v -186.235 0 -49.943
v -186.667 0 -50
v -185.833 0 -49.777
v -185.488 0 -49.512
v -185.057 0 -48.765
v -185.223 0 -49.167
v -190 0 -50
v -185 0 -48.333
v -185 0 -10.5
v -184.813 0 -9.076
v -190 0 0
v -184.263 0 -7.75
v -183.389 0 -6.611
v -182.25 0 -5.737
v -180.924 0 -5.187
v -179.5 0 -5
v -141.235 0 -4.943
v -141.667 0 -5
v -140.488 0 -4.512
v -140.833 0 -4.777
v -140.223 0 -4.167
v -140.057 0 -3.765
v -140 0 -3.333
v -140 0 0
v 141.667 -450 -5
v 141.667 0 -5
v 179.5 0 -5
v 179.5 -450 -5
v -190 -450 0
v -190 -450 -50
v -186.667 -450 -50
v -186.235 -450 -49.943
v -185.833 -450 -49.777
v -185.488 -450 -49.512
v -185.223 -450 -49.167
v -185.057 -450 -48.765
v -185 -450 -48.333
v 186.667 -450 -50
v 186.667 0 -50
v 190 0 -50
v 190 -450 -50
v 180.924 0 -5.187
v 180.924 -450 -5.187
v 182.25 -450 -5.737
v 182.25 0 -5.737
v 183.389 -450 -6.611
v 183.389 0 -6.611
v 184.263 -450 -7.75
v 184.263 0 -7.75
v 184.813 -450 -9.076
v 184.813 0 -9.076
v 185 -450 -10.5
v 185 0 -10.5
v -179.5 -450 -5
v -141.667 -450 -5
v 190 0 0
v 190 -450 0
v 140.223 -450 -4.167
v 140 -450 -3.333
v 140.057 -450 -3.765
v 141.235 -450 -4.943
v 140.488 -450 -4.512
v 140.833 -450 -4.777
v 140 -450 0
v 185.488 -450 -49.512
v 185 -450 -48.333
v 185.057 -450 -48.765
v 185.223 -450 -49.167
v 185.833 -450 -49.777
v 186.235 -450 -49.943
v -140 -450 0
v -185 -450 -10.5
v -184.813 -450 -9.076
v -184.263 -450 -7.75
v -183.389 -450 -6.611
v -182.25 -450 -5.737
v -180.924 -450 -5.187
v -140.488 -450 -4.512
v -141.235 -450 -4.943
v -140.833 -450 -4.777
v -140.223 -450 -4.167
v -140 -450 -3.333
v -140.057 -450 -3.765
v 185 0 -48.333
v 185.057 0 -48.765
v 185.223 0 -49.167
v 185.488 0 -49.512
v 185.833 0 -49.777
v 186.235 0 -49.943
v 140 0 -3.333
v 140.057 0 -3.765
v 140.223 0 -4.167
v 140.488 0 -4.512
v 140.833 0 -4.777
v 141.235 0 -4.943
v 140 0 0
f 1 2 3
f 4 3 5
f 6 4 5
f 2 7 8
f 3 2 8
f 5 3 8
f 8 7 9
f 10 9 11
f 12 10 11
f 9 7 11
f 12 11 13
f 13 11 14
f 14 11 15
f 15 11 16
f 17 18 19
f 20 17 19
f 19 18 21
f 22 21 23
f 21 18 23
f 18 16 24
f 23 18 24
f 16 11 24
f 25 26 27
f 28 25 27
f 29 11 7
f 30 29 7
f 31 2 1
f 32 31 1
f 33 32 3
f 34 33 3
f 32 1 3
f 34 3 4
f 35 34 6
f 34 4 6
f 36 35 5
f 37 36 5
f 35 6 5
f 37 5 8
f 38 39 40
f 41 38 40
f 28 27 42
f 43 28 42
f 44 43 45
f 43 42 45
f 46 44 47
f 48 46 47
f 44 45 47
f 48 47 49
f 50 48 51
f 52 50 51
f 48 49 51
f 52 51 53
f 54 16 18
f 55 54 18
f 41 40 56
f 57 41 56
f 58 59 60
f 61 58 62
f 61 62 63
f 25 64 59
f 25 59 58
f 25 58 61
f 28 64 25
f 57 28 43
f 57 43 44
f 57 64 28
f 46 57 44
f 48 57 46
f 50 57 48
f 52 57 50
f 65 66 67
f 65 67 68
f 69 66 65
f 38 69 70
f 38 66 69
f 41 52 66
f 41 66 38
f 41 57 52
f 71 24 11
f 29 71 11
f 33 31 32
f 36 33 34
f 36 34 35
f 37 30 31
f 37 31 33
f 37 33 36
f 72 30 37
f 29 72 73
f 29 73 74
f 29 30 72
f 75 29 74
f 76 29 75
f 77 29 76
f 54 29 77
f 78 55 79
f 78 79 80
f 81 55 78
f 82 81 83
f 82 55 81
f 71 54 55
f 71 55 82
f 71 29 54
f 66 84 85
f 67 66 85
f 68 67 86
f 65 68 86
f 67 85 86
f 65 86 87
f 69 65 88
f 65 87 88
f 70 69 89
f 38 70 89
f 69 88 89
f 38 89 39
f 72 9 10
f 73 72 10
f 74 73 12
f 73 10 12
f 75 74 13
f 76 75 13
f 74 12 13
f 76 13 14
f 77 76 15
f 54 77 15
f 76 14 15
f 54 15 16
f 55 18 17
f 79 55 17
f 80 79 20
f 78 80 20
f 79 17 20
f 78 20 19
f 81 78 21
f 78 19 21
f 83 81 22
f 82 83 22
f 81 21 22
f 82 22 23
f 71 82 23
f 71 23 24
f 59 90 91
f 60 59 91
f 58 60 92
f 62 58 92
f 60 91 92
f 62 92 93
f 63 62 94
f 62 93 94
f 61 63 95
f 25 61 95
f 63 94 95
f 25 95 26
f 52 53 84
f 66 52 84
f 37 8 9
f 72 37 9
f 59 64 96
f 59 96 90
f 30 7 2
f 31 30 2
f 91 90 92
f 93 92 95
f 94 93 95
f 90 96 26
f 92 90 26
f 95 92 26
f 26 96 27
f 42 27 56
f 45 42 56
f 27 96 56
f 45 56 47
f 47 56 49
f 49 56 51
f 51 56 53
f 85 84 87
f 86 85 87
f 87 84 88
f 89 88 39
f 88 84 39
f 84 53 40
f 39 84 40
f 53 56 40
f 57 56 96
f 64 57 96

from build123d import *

# Parameters (mm, degrees)
L_ANGLE_EQUAL_L_ANGLE_5X5_1_DEPTH   = 450
L_ANGLE_EQUAL_L_ANGLE_5X5_1_2_DEPTH = 450


with BuildPart() as part:
    # Sketch1 → L angle (equal) L ANGLE 5X5(1) (new body)
    with BuildSketch(Plane(origin=(-190, 0, 0), x_dir=(1, 0, 0), z_dir=(0, -1, 0))):
        with BuildLine():
            Line((50, 0), (0, 0))
            Line((0, 0), (0, -50))
            Line((0, -50), (3.3333, -50))
            ThreePointArc((3.3333, -50), (4.511834872, -49.511834872), (5, -48.3333))
            Line((5, -48.3333), (5, -10.5))
            ThreePointArc((5, -10.5), (6.610912703, -6.610912703), (10.5, -5))
            Line((10.5, -5), (48.3333, -5))
            ThreePointArc((48.3333, -5), (49.511834872, -4.511834872), (50, -3.3333))
            Line((50, -3.3333), (50, 0))
        make_face()
    extrude(amount=L_ANGLE_EQUAL_L_ANGLE_5X5_1_DEPTH)


with BuildPart() as body_2:
    # Sketch1 on segment 2 (carried to segment 2) → L angle _equal_ L ANGLE 5X5_1 2 (new body)
    with BuildSketch(Plane(origin=(190, 0, 0), x_dir=(0, 0, -1), z_dir=(0, -1, 0))):
        with BuildLine():
            Line((50, 0), (0, 0))
            Line((0, 0), (0, -50))
            Line((0, -50), (3.3333, -50))
            ThreePointArc((3.3333, -50), (4.511834872, -49.511834872), (5, -48.3333))
            Line((5, -48.3333), (5, -10.5))
            ThreePointArc((5, -10.5), (6.610912703, -6.610912703), (10.5, -5))
            Line((10.5, -5), (48.3333, -5))
            ThreePointArc((48.3333, -5), (49.511834872, -4.511834872), (50, -3.3333))
            Line((50, -3.3333), (50, 0))
        make_face()
    extrude(amount=L_ANGLE_EQUAL_L_ANGLE_5X5_1_2_DEPTH)


solid = Compound([part.part, body_2.part])
